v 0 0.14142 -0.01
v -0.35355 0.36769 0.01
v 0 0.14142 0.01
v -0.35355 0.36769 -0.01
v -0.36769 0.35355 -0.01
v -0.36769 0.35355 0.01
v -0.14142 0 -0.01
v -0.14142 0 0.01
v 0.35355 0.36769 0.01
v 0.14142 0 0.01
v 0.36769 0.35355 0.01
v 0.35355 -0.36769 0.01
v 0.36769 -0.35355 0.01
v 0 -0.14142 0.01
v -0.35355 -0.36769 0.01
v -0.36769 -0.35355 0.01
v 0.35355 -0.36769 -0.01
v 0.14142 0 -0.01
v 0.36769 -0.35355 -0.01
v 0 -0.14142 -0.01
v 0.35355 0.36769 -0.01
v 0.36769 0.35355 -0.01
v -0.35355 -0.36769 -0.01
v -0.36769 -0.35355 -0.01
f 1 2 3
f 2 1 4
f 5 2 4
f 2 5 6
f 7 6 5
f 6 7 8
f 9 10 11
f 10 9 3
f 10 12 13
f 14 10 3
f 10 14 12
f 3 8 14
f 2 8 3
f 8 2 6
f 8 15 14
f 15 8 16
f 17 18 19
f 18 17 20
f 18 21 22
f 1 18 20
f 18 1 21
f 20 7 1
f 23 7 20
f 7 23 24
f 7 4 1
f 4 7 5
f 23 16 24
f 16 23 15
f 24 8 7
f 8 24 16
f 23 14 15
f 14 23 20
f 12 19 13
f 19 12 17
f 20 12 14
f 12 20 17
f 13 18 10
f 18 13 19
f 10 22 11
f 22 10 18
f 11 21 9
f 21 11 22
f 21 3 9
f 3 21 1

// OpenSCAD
use <lib.scad>

bounds = [1,1,1];
body = [0.9, 0.9, 0.9];

module blade() {
	translate([0.1,0,0.03]) rotate([30,0,0]) scale([3,1,1]) cyl(0.03, 0.03, 0.01);
}

module rotorHD($fn=8) {
	translate([0,0,0.01]) union() {
		cyl(0.03, 0.03, 0.1);
		blade();
		rotate([0,0,180]) blade();
	}
}

module rotorLD($fn=4) {
	translate([0,0,0.01]) union() {
		cyl(0.03, 0.03, 0.1);
		blade();
		rotate([0,0,180]) blade();
	}
}

module spar() {
	hull() {
		translate([0,0,0]) box([0.2, 0.2, 0.02]);
		translate([0,0.5,0]) box([0.02, 0.02, 0.02]);
	}
}

module spars() {
	for (i = [0:90:360]) rotate([0,0,i+45]) spar();
}

module chassisHD() {
	union() {
		difference() {
			sphere(r=0.2, $fn=24);
			translate([0,0,-0.35]) box([0.45,0.45,0.45]);
			translate([0,0,0.35]) box([0.45,0.45,0.45]);
		}
		rotate([90,0,0]) translate([0,0,0.05]) cyl(0.075, 0.075, 0.4,$fn=16);
	}
}

module chassisLD() {
	union() {
		difference() {
			sphere(r=0.2, $fn=12);
			translate([0,0,-0.35]) box([0.45,0.45,0.45]);
			translate([0,0,0.35]) box([0.45,0.45,0.45]);
		}
		rotate([90,0,0]) translate([0,0,0.05]) cyl(0.075, 0.075, 0.4,$fn=8);
	}
}

d = 4;

//chassisHD();
//chassisLD();
spars();
//rotorHD();
//rotorLD();
